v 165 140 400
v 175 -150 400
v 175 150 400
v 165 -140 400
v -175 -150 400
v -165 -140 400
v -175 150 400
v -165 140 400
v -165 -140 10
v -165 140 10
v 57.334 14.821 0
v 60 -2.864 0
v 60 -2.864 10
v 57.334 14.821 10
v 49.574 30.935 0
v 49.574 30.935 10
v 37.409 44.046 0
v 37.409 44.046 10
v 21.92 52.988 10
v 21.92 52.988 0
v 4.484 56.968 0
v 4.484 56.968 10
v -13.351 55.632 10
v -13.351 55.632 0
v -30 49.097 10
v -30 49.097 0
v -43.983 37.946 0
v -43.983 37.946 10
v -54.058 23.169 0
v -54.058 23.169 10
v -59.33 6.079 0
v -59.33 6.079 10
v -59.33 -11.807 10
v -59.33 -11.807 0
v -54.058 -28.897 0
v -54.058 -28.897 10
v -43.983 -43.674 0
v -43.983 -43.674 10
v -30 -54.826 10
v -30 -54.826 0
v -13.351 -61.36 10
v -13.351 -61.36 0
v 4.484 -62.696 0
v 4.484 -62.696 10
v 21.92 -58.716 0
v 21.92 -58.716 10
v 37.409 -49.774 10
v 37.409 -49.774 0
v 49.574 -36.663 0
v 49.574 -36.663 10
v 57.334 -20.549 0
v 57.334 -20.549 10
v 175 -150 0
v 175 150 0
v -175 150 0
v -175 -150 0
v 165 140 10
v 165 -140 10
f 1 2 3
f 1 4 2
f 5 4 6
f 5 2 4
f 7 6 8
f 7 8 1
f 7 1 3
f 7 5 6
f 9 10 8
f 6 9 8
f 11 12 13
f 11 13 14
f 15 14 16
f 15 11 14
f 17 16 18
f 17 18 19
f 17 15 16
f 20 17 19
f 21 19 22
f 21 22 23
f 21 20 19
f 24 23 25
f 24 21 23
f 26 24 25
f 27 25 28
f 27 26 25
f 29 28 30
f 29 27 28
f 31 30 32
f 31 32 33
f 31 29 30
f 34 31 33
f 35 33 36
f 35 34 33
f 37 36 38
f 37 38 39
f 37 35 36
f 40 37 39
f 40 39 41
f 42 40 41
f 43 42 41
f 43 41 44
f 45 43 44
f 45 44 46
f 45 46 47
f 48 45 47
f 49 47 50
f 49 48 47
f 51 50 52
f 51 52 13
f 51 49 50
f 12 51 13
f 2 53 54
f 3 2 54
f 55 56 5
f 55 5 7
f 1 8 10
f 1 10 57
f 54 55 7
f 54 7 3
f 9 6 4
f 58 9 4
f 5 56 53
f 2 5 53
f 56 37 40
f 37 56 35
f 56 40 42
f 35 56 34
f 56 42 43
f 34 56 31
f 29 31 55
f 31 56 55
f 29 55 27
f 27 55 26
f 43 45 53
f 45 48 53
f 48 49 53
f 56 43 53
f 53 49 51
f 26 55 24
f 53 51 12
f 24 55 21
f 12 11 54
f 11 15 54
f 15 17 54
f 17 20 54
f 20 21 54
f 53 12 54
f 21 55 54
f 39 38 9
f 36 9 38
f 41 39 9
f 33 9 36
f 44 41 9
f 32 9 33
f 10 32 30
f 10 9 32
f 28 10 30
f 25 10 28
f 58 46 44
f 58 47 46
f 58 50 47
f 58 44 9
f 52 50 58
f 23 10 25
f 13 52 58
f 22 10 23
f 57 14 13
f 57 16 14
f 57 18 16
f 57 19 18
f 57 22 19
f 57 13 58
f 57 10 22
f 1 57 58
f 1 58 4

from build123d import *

# Parameters (mm, degrees)
SKETCH1_W           = 350
SKETCH1_H           = 300
SKETCH1_R           = 60
BOSS_EXTRUDE1_DEPTH = 10
SKETCH2_W           = 400
SKETCH2_H           = 300
BOSS_EXTRUDE2_DEPTH = 10
SKETCH3_W           = 350
SKETCH3_H           = 400
BOSS_EXTRUDE3_DEPTH = 10


with BuildPart() as part:
    # Sketch1 → Boss-Extrude1 (new body)
    with BuildSketch(Plane.XY):
        Rectangle(SKETCH1_W, SKETCH1_H)
        with Locations((0, -2.864034897)):
            Circle(SKETCH1_R, mode=Mode.SUBTRACT)
    extrude(amount=BOSS_EXTRUDE1_DEPTH)

    # Sketch2 → Boss-Extrude2 (add)
    with BuildSketch(Plane.ZY.offset(175)):
        with Locations((200, 0)):
            Rectangle(SKETCH2_W, SKETCH2_H)
    boss_extrude2 = extrude(amount=-BOSS_EXTRUDE2_DEPTH)

    # Mirror1: Boss-Extrude2 across plane
    add(boss_extrude2.mirror(Plane(origin=(0, 0, 0), x_dir=(0, 0, 1), z_dir=(1, 0, 0))))

    # Sketch3 → Boss-Extrude3 (add)
    with BuildSketch(Plane.XZ.offset(150)):
        with Locations((0, 200)):
            Rectangle(SKETCH3_W, SKETCH3_H)
    boss_extrude3 = extrude(amount=-BOSS_EXTRUDE3_DEPTH)

    # Mirror2: Boss-Extrude3 across plane
    add(boss_extrude3.mirror(Plane.ZX))


solid = part.part
